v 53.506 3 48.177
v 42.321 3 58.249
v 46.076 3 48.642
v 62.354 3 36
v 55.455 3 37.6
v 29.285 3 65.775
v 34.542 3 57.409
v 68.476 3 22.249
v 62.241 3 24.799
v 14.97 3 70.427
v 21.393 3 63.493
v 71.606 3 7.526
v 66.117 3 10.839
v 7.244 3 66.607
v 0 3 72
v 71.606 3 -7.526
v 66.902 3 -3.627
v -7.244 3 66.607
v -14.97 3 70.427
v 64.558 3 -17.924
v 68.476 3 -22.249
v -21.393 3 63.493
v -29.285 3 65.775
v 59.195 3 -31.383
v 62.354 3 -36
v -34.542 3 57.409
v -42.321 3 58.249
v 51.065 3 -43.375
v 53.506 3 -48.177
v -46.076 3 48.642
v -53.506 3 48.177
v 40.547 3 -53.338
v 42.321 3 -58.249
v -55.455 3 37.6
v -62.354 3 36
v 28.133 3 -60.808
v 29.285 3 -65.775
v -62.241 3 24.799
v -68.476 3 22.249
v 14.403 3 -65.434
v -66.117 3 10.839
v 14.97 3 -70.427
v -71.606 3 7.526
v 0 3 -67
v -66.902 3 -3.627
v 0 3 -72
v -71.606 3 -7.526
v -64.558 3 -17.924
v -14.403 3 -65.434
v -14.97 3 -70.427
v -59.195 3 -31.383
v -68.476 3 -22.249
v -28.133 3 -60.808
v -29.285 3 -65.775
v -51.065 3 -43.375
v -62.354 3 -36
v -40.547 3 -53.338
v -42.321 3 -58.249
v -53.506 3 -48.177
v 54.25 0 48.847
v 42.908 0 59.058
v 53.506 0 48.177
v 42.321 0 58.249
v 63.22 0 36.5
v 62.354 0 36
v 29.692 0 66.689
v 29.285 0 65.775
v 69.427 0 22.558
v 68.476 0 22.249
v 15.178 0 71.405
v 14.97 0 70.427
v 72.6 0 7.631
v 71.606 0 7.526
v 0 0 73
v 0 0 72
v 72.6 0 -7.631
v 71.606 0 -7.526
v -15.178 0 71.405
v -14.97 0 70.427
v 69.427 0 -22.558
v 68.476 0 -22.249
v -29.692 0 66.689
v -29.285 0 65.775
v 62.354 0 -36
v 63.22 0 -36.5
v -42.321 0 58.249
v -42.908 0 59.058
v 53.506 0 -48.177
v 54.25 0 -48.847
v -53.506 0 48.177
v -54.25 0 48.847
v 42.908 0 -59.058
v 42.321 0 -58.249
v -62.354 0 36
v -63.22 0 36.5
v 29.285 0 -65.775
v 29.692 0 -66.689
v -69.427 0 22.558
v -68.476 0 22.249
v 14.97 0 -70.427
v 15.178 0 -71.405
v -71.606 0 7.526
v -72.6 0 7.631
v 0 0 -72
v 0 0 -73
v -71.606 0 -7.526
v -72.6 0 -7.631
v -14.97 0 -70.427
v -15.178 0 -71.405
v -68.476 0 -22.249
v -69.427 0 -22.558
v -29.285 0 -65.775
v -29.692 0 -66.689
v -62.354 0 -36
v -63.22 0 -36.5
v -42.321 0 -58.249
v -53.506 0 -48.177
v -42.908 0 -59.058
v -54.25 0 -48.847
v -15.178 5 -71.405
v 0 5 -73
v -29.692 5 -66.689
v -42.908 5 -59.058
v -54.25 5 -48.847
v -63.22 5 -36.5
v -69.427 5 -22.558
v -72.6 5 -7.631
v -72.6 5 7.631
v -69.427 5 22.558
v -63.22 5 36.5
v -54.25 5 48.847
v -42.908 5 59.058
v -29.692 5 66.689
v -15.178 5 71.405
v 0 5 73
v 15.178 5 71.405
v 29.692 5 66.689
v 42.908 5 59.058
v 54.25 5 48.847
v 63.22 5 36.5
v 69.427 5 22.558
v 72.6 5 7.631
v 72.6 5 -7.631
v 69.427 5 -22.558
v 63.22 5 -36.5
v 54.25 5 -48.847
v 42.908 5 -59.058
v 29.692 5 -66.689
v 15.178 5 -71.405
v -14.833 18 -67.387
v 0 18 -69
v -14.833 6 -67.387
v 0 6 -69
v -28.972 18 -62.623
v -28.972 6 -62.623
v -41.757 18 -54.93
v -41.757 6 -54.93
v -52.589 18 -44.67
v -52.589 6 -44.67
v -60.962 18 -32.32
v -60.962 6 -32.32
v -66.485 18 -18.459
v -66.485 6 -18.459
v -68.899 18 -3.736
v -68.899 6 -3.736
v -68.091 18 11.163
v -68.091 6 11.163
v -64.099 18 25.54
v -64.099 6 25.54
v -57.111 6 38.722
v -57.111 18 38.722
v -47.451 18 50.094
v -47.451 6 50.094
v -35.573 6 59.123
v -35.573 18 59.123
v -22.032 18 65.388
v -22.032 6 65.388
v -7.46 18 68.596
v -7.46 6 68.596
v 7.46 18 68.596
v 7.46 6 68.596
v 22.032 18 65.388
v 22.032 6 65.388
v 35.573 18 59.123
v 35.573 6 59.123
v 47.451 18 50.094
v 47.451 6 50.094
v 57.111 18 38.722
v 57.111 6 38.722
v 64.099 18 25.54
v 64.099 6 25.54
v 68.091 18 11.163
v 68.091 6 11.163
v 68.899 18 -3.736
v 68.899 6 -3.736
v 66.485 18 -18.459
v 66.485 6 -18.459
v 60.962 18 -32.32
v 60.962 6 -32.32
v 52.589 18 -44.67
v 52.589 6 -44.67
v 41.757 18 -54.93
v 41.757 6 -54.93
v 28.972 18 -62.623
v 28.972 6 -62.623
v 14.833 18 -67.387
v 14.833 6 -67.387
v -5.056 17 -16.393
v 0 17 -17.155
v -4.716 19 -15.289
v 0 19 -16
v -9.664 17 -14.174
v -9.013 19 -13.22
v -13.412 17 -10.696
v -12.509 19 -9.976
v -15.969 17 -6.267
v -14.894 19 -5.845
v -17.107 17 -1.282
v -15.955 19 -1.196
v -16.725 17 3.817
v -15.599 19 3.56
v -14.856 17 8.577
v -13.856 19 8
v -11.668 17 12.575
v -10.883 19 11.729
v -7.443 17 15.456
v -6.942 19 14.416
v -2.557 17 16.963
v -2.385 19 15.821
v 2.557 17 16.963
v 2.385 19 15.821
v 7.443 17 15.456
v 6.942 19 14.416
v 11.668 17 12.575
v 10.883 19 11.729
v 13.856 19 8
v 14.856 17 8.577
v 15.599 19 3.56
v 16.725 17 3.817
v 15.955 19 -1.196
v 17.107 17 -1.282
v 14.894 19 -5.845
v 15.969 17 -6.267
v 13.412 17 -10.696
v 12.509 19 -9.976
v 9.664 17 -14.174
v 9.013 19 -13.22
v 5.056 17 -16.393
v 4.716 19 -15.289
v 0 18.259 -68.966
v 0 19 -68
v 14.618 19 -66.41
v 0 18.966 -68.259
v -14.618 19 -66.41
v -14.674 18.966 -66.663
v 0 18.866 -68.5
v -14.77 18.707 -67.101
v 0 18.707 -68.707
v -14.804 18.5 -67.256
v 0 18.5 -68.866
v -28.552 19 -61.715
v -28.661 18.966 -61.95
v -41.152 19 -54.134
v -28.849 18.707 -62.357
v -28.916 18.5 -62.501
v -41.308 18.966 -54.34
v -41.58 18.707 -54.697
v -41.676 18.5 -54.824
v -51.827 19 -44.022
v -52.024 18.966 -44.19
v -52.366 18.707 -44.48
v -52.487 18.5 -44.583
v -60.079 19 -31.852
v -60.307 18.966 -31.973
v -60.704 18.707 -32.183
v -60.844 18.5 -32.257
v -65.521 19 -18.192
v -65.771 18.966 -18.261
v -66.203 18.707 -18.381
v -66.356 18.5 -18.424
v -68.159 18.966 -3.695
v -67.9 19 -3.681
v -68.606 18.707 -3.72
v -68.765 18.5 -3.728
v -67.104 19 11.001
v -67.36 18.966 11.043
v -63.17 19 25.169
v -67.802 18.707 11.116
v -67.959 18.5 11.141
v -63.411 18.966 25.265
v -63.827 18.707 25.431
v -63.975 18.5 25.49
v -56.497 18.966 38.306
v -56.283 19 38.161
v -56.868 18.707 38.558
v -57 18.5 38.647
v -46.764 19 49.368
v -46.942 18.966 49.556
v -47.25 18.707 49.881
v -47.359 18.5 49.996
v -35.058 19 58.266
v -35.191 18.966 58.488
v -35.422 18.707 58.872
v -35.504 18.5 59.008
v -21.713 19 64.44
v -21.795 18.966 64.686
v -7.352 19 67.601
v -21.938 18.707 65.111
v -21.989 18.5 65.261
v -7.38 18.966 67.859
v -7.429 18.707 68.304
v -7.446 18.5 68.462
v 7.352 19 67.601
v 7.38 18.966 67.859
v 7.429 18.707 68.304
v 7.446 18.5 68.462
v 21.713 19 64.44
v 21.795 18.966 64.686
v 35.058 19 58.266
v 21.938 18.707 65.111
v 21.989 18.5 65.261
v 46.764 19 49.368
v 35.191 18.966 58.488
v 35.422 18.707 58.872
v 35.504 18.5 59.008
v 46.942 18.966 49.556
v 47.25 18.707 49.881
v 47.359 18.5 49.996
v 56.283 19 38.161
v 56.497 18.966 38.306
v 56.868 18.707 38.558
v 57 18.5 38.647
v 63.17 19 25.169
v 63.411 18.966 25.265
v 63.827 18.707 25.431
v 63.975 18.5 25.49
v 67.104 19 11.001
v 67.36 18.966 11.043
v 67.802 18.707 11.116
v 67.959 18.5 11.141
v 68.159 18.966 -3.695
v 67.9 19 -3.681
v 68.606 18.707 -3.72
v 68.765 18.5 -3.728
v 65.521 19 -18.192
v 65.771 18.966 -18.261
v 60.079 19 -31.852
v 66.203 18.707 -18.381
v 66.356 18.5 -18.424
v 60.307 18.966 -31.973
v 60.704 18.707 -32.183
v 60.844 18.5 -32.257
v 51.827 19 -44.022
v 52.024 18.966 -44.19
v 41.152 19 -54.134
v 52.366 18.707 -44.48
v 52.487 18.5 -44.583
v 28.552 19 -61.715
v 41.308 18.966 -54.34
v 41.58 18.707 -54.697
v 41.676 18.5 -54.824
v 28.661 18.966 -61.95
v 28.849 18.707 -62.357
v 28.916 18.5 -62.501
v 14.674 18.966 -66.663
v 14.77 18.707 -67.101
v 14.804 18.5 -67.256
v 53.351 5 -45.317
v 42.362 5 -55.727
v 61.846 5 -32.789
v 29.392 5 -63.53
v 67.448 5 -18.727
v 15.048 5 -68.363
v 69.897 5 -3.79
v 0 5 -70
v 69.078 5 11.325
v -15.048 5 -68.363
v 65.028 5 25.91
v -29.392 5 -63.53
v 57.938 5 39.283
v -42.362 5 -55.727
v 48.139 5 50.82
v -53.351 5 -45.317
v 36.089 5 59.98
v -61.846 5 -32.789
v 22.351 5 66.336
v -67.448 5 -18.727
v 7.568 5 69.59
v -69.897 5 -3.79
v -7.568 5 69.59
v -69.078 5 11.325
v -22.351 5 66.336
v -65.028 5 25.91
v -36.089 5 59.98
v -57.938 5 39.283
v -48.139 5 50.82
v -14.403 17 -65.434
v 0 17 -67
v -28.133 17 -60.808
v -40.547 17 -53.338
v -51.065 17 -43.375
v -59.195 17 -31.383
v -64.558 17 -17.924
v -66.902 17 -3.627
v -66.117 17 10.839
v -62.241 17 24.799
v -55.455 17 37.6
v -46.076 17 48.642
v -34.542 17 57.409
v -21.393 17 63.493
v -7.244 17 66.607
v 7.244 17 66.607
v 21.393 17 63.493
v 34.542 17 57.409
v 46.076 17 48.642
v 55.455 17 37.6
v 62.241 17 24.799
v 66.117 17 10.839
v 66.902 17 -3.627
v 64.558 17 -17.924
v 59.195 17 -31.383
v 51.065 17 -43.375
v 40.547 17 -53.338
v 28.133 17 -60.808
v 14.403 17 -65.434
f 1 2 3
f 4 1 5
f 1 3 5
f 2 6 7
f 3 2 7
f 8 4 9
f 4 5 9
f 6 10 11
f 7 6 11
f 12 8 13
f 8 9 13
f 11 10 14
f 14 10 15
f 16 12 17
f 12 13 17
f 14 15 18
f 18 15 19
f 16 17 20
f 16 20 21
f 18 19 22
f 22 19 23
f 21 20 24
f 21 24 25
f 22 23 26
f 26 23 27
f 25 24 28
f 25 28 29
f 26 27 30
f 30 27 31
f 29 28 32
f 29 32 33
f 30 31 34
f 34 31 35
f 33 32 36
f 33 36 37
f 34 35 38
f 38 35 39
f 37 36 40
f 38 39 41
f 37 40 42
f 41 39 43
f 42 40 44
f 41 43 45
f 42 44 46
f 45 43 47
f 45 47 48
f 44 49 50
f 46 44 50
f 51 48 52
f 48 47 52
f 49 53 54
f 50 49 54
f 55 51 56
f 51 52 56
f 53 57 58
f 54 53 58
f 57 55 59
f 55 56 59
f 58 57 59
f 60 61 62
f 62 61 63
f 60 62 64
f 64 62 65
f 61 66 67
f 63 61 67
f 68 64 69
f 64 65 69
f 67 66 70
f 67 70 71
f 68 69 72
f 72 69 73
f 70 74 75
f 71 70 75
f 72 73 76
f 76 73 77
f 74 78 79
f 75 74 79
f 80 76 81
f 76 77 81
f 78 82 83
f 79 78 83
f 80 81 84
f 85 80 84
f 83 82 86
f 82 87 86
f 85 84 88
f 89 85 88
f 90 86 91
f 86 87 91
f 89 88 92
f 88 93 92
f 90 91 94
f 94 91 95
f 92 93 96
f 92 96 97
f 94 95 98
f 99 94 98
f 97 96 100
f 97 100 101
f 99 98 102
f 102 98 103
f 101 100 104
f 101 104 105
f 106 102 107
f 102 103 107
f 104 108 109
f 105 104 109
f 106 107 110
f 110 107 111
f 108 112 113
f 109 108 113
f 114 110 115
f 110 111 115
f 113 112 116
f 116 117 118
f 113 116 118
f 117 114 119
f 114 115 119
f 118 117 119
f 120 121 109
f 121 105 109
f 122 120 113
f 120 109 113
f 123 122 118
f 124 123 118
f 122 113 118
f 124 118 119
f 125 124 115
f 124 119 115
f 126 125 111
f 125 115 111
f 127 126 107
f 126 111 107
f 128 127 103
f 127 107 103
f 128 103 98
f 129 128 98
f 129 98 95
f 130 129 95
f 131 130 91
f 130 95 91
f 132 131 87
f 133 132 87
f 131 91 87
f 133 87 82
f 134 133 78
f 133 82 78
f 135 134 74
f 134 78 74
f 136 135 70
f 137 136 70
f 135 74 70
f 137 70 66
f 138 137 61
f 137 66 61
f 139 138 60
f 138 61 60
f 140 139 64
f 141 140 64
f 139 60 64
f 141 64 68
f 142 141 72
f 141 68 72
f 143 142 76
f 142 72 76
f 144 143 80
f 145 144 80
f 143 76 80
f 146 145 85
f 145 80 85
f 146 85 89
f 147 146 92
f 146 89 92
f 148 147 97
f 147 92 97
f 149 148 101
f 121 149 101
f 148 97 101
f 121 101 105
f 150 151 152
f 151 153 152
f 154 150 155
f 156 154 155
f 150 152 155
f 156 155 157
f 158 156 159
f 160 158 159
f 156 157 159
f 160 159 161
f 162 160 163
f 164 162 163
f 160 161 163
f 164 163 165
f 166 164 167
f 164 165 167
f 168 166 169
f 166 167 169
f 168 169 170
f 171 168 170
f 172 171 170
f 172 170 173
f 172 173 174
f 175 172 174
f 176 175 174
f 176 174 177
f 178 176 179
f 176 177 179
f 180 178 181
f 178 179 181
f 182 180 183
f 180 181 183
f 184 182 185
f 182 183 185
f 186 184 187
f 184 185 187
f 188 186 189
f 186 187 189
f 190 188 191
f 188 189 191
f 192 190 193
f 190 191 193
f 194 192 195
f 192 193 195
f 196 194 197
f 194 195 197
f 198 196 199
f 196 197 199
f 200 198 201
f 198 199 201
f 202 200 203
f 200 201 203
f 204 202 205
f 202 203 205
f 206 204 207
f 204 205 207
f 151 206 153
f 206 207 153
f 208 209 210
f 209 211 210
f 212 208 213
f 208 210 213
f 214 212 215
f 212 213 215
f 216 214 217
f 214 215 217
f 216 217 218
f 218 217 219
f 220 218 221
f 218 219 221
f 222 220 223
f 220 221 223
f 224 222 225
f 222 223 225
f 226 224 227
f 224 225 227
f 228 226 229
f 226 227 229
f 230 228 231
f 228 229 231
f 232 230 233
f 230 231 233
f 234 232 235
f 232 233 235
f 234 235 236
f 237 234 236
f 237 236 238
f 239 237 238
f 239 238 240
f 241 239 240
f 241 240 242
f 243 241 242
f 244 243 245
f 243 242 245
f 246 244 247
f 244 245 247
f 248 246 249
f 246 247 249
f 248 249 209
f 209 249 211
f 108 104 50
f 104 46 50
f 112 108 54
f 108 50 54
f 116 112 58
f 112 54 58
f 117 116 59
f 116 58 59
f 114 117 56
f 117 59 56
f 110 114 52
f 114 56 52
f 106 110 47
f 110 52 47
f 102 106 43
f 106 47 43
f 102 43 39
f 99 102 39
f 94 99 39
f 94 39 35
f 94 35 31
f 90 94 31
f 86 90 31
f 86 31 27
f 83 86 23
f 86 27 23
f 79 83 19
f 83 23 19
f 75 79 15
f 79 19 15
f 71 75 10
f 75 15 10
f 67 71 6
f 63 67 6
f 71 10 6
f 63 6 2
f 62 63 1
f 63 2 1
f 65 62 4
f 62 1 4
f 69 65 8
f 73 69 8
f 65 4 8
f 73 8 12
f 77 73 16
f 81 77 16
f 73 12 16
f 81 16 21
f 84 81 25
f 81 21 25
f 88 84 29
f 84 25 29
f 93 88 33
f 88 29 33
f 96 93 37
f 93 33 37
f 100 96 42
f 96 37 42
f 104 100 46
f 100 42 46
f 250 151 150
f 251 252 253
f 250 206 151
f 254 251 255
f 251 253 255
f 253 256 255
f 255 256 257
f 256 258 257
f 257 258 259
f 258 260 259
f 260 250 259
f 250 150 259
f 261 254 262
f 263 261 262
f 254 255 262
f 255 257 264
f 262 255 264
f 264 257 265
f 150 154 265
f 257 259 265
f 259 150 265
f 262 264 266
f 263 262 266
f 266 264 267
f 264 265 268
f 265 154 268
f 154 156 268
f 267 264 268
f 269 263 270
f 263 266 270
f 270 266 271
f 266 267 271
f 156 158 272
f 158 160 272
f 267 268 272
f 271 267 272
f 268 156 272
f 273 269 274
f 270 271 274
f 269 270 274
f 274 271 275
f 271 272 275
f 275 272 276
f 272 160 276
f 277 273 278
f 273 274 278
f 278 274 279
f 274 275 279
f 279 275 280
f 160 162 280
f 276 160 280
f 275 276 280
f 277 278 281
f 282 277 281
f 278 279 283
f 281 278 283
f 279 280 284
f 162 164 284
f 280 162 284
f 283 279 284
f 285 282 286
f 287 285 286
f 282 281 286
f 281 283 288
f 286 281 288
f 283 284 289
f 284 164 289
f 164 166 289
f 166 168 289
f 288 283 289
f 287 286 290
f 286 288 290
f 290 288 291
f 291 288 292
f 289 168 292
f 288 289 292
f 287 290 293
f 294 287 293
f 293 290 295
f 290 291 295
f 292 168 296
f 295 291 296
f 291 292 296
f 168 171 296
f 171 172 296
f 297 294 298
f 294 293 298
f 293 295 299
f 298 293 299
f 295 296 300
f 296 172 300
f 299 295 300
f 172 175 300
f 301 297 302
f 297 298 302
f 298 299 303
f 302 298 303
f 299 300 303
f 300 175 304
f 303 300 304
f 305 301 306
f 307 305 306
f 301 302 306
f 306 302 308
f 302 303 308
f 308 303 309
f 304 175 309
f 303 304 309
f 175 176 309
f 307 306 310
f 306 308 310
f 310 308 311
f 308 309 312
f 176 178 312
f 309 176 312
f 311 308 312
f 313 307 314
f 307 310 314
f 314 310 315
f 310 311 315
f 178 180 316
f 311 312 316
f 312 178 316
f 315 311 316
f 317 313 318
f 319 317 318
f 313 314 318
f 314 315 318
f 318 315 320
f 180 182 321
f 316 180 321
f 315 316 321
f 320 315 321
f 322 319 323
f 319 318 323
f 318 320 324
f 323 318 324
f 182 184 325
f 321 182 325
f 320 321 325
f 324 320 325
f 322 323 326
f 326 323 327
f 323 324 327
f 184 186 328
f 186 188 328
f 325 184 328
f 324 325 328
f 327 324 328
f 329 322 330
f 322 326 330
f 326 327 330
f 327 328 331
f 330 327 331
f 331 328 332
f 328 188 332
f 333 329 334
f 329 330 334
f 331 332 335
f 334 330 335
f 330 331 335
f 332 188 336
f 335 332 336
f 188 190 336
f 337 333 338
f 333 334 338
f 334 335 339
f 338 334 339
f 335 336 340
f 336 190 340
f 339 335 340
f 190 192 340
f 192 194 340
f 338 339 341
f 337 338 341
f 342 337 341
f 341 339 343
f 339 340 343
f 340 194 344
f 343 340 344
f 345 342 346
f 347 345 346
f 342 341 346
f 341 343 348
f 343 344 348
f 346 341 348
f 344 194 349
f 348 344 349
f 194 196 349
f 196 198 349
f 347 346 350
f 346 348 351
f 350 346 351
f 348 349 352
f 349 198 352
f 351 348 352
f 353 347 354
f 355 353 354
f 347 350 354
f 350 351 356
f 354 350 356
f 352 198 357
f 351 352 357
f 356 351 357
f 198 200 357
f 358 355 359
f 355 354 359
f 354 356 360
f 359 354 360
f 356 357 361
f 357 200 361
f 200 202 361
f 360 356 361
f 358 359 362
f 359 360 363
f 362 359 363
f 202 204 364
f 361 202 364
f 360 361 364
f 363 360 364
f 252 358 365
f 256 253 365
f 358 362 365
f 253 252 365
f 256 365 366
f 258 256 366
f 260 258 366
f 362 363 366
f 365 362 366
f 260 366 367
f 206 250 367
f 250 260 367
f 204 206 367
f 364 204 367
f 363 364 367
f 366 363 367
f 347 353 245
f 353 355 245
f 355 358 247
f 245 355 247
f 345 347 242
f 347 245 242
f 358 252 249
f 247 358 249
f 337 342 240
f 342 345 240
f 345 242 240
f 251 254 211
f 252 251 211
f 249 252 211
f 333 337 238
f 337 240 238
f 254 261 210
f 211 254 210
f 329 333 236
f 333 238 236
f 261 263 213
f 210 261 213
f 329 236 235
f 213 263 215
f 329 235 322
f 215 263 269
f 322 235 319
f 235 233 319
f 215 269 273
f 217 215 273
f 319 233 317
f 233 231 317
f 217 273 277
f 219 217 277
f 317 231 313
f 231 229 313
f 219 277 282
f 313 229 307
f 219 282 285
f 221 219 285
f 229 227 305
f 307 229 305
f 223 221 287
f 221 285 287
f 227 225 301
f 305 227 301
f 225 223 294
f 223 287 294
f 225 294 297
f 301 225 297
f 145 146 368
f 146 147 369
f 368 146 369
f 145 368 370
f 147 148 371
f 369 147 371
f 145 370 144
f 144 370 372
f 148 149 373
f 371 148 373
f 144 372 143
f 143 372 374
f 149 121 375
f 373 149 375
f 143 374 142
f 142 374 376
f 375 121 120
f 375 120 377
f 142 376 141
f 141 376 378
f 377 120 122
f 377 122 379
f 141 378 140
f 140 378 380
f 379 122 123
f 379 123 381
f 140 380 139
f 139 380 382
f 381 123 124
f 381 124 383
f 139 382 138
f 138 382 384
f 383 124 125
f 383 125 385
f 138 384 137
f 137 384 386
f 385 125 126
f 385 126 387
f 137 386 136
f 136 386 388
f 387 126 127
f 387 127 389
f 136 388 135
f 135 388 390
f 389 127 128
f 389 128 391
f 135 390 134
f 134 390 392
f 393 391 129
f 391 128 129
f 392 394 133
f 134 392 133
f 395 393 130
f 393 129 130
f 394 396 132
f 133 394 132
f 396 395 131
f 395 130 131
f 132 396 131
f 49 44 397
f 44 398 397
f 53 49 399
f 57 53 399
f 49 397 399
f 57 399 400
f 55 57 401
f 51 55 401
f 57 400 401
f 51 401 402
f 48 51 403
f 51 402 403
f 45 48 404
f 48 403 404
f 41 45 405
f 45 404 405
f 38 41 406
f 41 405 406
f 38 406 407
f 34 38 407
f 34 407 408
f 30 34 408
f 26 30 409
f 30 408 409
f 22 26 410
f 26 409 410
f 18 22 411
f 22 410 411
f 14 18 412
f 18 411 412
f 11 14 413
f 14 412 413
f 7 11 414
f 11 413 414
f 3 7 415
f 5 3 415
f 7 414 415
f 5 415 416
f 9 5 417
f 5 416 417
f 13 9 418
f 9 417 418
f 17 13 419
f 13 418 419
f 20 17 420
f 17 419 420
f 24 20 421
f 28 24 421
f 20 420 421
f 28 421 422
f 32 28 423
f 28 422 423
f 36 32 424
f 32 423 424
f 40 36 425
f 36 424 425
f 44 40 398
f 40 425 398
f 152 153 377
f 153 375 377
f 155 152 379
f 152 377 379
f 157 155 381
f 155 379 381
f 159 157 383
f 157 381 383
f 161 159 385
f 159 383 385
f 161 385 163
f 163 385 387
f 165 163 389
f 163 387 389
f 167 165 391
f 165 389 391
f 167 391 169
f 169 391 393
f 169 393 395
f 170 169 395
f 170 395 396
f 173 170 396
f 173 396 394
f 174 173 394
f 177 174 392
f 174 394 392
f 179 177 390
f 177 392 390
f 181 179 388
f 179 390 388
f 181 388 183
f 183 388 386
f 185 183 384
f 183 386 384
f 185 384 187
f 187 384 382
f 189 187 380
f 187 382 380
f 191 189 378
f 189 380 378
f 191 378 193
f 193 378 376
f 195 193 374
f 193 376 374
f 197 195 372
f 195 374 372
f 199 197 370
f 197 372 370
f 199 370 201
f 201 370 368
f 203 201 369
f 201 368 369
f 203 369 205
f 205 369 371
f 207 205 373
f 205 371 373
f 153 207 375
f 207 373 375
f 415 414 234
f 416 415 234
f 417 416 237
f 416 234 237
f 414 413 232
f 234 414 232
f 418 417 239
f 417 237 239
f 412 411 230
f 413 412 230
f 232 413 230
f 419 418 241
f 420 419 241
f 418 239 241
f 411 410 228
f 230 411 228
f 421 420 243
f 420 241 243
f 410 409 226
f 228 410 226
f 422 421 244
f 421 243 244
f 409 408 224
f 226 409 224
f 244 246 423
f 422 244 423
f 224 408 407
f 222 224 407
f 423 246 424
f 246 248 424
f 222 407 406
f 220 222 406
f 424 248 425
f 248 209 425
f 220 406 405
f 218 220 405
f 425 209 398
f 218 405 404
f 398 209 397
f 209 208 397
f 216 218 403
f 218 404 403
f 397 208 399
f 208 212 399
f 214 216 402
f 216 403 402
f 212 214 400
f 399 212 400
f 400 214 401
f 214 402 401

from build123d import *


with BuildPart() as part:
    # Schizzo1 → Rivoluzione1 (revolve)
    with BuildSketch(Plane(origin=(0, 0, 0), x_dir=(0, 0, -1), z_dir=(1, 0, 0)), mode=Mode.PRIVATE) as rivoluzione1_sk:
        with BuildLine():
            Line((-73, 0), (-72, 0))
            Line((-72, 0), (-72, 3))
            Line((-72, 3), (-67, 3))
            Line((-67, 3), (-67, 17))
            Line((-67, 17), (-17.154700538, 17))
            Line((-17.154700538, 17), (-16, 19))
            Line((-16, 19), (-68, 19))
            ThreePointArc((-68, 19), (-68.707106781, 18.707106781), (-69, 18))
            Line((-69, 18), (-69, 6))
            Line((-69, 6), (-70, 5))
            Line((-70, 5), (-73, 5))
            Line((-73, 5), (-73, 0))
        make_face()
    revolve(rivoluzione1_sk.sketch.rotate(Axis((0, 0, 0), (0, 1, 0)), 180), axis=Axis((0, 0, 0), (0, 1, 0)))


solid = part.part
